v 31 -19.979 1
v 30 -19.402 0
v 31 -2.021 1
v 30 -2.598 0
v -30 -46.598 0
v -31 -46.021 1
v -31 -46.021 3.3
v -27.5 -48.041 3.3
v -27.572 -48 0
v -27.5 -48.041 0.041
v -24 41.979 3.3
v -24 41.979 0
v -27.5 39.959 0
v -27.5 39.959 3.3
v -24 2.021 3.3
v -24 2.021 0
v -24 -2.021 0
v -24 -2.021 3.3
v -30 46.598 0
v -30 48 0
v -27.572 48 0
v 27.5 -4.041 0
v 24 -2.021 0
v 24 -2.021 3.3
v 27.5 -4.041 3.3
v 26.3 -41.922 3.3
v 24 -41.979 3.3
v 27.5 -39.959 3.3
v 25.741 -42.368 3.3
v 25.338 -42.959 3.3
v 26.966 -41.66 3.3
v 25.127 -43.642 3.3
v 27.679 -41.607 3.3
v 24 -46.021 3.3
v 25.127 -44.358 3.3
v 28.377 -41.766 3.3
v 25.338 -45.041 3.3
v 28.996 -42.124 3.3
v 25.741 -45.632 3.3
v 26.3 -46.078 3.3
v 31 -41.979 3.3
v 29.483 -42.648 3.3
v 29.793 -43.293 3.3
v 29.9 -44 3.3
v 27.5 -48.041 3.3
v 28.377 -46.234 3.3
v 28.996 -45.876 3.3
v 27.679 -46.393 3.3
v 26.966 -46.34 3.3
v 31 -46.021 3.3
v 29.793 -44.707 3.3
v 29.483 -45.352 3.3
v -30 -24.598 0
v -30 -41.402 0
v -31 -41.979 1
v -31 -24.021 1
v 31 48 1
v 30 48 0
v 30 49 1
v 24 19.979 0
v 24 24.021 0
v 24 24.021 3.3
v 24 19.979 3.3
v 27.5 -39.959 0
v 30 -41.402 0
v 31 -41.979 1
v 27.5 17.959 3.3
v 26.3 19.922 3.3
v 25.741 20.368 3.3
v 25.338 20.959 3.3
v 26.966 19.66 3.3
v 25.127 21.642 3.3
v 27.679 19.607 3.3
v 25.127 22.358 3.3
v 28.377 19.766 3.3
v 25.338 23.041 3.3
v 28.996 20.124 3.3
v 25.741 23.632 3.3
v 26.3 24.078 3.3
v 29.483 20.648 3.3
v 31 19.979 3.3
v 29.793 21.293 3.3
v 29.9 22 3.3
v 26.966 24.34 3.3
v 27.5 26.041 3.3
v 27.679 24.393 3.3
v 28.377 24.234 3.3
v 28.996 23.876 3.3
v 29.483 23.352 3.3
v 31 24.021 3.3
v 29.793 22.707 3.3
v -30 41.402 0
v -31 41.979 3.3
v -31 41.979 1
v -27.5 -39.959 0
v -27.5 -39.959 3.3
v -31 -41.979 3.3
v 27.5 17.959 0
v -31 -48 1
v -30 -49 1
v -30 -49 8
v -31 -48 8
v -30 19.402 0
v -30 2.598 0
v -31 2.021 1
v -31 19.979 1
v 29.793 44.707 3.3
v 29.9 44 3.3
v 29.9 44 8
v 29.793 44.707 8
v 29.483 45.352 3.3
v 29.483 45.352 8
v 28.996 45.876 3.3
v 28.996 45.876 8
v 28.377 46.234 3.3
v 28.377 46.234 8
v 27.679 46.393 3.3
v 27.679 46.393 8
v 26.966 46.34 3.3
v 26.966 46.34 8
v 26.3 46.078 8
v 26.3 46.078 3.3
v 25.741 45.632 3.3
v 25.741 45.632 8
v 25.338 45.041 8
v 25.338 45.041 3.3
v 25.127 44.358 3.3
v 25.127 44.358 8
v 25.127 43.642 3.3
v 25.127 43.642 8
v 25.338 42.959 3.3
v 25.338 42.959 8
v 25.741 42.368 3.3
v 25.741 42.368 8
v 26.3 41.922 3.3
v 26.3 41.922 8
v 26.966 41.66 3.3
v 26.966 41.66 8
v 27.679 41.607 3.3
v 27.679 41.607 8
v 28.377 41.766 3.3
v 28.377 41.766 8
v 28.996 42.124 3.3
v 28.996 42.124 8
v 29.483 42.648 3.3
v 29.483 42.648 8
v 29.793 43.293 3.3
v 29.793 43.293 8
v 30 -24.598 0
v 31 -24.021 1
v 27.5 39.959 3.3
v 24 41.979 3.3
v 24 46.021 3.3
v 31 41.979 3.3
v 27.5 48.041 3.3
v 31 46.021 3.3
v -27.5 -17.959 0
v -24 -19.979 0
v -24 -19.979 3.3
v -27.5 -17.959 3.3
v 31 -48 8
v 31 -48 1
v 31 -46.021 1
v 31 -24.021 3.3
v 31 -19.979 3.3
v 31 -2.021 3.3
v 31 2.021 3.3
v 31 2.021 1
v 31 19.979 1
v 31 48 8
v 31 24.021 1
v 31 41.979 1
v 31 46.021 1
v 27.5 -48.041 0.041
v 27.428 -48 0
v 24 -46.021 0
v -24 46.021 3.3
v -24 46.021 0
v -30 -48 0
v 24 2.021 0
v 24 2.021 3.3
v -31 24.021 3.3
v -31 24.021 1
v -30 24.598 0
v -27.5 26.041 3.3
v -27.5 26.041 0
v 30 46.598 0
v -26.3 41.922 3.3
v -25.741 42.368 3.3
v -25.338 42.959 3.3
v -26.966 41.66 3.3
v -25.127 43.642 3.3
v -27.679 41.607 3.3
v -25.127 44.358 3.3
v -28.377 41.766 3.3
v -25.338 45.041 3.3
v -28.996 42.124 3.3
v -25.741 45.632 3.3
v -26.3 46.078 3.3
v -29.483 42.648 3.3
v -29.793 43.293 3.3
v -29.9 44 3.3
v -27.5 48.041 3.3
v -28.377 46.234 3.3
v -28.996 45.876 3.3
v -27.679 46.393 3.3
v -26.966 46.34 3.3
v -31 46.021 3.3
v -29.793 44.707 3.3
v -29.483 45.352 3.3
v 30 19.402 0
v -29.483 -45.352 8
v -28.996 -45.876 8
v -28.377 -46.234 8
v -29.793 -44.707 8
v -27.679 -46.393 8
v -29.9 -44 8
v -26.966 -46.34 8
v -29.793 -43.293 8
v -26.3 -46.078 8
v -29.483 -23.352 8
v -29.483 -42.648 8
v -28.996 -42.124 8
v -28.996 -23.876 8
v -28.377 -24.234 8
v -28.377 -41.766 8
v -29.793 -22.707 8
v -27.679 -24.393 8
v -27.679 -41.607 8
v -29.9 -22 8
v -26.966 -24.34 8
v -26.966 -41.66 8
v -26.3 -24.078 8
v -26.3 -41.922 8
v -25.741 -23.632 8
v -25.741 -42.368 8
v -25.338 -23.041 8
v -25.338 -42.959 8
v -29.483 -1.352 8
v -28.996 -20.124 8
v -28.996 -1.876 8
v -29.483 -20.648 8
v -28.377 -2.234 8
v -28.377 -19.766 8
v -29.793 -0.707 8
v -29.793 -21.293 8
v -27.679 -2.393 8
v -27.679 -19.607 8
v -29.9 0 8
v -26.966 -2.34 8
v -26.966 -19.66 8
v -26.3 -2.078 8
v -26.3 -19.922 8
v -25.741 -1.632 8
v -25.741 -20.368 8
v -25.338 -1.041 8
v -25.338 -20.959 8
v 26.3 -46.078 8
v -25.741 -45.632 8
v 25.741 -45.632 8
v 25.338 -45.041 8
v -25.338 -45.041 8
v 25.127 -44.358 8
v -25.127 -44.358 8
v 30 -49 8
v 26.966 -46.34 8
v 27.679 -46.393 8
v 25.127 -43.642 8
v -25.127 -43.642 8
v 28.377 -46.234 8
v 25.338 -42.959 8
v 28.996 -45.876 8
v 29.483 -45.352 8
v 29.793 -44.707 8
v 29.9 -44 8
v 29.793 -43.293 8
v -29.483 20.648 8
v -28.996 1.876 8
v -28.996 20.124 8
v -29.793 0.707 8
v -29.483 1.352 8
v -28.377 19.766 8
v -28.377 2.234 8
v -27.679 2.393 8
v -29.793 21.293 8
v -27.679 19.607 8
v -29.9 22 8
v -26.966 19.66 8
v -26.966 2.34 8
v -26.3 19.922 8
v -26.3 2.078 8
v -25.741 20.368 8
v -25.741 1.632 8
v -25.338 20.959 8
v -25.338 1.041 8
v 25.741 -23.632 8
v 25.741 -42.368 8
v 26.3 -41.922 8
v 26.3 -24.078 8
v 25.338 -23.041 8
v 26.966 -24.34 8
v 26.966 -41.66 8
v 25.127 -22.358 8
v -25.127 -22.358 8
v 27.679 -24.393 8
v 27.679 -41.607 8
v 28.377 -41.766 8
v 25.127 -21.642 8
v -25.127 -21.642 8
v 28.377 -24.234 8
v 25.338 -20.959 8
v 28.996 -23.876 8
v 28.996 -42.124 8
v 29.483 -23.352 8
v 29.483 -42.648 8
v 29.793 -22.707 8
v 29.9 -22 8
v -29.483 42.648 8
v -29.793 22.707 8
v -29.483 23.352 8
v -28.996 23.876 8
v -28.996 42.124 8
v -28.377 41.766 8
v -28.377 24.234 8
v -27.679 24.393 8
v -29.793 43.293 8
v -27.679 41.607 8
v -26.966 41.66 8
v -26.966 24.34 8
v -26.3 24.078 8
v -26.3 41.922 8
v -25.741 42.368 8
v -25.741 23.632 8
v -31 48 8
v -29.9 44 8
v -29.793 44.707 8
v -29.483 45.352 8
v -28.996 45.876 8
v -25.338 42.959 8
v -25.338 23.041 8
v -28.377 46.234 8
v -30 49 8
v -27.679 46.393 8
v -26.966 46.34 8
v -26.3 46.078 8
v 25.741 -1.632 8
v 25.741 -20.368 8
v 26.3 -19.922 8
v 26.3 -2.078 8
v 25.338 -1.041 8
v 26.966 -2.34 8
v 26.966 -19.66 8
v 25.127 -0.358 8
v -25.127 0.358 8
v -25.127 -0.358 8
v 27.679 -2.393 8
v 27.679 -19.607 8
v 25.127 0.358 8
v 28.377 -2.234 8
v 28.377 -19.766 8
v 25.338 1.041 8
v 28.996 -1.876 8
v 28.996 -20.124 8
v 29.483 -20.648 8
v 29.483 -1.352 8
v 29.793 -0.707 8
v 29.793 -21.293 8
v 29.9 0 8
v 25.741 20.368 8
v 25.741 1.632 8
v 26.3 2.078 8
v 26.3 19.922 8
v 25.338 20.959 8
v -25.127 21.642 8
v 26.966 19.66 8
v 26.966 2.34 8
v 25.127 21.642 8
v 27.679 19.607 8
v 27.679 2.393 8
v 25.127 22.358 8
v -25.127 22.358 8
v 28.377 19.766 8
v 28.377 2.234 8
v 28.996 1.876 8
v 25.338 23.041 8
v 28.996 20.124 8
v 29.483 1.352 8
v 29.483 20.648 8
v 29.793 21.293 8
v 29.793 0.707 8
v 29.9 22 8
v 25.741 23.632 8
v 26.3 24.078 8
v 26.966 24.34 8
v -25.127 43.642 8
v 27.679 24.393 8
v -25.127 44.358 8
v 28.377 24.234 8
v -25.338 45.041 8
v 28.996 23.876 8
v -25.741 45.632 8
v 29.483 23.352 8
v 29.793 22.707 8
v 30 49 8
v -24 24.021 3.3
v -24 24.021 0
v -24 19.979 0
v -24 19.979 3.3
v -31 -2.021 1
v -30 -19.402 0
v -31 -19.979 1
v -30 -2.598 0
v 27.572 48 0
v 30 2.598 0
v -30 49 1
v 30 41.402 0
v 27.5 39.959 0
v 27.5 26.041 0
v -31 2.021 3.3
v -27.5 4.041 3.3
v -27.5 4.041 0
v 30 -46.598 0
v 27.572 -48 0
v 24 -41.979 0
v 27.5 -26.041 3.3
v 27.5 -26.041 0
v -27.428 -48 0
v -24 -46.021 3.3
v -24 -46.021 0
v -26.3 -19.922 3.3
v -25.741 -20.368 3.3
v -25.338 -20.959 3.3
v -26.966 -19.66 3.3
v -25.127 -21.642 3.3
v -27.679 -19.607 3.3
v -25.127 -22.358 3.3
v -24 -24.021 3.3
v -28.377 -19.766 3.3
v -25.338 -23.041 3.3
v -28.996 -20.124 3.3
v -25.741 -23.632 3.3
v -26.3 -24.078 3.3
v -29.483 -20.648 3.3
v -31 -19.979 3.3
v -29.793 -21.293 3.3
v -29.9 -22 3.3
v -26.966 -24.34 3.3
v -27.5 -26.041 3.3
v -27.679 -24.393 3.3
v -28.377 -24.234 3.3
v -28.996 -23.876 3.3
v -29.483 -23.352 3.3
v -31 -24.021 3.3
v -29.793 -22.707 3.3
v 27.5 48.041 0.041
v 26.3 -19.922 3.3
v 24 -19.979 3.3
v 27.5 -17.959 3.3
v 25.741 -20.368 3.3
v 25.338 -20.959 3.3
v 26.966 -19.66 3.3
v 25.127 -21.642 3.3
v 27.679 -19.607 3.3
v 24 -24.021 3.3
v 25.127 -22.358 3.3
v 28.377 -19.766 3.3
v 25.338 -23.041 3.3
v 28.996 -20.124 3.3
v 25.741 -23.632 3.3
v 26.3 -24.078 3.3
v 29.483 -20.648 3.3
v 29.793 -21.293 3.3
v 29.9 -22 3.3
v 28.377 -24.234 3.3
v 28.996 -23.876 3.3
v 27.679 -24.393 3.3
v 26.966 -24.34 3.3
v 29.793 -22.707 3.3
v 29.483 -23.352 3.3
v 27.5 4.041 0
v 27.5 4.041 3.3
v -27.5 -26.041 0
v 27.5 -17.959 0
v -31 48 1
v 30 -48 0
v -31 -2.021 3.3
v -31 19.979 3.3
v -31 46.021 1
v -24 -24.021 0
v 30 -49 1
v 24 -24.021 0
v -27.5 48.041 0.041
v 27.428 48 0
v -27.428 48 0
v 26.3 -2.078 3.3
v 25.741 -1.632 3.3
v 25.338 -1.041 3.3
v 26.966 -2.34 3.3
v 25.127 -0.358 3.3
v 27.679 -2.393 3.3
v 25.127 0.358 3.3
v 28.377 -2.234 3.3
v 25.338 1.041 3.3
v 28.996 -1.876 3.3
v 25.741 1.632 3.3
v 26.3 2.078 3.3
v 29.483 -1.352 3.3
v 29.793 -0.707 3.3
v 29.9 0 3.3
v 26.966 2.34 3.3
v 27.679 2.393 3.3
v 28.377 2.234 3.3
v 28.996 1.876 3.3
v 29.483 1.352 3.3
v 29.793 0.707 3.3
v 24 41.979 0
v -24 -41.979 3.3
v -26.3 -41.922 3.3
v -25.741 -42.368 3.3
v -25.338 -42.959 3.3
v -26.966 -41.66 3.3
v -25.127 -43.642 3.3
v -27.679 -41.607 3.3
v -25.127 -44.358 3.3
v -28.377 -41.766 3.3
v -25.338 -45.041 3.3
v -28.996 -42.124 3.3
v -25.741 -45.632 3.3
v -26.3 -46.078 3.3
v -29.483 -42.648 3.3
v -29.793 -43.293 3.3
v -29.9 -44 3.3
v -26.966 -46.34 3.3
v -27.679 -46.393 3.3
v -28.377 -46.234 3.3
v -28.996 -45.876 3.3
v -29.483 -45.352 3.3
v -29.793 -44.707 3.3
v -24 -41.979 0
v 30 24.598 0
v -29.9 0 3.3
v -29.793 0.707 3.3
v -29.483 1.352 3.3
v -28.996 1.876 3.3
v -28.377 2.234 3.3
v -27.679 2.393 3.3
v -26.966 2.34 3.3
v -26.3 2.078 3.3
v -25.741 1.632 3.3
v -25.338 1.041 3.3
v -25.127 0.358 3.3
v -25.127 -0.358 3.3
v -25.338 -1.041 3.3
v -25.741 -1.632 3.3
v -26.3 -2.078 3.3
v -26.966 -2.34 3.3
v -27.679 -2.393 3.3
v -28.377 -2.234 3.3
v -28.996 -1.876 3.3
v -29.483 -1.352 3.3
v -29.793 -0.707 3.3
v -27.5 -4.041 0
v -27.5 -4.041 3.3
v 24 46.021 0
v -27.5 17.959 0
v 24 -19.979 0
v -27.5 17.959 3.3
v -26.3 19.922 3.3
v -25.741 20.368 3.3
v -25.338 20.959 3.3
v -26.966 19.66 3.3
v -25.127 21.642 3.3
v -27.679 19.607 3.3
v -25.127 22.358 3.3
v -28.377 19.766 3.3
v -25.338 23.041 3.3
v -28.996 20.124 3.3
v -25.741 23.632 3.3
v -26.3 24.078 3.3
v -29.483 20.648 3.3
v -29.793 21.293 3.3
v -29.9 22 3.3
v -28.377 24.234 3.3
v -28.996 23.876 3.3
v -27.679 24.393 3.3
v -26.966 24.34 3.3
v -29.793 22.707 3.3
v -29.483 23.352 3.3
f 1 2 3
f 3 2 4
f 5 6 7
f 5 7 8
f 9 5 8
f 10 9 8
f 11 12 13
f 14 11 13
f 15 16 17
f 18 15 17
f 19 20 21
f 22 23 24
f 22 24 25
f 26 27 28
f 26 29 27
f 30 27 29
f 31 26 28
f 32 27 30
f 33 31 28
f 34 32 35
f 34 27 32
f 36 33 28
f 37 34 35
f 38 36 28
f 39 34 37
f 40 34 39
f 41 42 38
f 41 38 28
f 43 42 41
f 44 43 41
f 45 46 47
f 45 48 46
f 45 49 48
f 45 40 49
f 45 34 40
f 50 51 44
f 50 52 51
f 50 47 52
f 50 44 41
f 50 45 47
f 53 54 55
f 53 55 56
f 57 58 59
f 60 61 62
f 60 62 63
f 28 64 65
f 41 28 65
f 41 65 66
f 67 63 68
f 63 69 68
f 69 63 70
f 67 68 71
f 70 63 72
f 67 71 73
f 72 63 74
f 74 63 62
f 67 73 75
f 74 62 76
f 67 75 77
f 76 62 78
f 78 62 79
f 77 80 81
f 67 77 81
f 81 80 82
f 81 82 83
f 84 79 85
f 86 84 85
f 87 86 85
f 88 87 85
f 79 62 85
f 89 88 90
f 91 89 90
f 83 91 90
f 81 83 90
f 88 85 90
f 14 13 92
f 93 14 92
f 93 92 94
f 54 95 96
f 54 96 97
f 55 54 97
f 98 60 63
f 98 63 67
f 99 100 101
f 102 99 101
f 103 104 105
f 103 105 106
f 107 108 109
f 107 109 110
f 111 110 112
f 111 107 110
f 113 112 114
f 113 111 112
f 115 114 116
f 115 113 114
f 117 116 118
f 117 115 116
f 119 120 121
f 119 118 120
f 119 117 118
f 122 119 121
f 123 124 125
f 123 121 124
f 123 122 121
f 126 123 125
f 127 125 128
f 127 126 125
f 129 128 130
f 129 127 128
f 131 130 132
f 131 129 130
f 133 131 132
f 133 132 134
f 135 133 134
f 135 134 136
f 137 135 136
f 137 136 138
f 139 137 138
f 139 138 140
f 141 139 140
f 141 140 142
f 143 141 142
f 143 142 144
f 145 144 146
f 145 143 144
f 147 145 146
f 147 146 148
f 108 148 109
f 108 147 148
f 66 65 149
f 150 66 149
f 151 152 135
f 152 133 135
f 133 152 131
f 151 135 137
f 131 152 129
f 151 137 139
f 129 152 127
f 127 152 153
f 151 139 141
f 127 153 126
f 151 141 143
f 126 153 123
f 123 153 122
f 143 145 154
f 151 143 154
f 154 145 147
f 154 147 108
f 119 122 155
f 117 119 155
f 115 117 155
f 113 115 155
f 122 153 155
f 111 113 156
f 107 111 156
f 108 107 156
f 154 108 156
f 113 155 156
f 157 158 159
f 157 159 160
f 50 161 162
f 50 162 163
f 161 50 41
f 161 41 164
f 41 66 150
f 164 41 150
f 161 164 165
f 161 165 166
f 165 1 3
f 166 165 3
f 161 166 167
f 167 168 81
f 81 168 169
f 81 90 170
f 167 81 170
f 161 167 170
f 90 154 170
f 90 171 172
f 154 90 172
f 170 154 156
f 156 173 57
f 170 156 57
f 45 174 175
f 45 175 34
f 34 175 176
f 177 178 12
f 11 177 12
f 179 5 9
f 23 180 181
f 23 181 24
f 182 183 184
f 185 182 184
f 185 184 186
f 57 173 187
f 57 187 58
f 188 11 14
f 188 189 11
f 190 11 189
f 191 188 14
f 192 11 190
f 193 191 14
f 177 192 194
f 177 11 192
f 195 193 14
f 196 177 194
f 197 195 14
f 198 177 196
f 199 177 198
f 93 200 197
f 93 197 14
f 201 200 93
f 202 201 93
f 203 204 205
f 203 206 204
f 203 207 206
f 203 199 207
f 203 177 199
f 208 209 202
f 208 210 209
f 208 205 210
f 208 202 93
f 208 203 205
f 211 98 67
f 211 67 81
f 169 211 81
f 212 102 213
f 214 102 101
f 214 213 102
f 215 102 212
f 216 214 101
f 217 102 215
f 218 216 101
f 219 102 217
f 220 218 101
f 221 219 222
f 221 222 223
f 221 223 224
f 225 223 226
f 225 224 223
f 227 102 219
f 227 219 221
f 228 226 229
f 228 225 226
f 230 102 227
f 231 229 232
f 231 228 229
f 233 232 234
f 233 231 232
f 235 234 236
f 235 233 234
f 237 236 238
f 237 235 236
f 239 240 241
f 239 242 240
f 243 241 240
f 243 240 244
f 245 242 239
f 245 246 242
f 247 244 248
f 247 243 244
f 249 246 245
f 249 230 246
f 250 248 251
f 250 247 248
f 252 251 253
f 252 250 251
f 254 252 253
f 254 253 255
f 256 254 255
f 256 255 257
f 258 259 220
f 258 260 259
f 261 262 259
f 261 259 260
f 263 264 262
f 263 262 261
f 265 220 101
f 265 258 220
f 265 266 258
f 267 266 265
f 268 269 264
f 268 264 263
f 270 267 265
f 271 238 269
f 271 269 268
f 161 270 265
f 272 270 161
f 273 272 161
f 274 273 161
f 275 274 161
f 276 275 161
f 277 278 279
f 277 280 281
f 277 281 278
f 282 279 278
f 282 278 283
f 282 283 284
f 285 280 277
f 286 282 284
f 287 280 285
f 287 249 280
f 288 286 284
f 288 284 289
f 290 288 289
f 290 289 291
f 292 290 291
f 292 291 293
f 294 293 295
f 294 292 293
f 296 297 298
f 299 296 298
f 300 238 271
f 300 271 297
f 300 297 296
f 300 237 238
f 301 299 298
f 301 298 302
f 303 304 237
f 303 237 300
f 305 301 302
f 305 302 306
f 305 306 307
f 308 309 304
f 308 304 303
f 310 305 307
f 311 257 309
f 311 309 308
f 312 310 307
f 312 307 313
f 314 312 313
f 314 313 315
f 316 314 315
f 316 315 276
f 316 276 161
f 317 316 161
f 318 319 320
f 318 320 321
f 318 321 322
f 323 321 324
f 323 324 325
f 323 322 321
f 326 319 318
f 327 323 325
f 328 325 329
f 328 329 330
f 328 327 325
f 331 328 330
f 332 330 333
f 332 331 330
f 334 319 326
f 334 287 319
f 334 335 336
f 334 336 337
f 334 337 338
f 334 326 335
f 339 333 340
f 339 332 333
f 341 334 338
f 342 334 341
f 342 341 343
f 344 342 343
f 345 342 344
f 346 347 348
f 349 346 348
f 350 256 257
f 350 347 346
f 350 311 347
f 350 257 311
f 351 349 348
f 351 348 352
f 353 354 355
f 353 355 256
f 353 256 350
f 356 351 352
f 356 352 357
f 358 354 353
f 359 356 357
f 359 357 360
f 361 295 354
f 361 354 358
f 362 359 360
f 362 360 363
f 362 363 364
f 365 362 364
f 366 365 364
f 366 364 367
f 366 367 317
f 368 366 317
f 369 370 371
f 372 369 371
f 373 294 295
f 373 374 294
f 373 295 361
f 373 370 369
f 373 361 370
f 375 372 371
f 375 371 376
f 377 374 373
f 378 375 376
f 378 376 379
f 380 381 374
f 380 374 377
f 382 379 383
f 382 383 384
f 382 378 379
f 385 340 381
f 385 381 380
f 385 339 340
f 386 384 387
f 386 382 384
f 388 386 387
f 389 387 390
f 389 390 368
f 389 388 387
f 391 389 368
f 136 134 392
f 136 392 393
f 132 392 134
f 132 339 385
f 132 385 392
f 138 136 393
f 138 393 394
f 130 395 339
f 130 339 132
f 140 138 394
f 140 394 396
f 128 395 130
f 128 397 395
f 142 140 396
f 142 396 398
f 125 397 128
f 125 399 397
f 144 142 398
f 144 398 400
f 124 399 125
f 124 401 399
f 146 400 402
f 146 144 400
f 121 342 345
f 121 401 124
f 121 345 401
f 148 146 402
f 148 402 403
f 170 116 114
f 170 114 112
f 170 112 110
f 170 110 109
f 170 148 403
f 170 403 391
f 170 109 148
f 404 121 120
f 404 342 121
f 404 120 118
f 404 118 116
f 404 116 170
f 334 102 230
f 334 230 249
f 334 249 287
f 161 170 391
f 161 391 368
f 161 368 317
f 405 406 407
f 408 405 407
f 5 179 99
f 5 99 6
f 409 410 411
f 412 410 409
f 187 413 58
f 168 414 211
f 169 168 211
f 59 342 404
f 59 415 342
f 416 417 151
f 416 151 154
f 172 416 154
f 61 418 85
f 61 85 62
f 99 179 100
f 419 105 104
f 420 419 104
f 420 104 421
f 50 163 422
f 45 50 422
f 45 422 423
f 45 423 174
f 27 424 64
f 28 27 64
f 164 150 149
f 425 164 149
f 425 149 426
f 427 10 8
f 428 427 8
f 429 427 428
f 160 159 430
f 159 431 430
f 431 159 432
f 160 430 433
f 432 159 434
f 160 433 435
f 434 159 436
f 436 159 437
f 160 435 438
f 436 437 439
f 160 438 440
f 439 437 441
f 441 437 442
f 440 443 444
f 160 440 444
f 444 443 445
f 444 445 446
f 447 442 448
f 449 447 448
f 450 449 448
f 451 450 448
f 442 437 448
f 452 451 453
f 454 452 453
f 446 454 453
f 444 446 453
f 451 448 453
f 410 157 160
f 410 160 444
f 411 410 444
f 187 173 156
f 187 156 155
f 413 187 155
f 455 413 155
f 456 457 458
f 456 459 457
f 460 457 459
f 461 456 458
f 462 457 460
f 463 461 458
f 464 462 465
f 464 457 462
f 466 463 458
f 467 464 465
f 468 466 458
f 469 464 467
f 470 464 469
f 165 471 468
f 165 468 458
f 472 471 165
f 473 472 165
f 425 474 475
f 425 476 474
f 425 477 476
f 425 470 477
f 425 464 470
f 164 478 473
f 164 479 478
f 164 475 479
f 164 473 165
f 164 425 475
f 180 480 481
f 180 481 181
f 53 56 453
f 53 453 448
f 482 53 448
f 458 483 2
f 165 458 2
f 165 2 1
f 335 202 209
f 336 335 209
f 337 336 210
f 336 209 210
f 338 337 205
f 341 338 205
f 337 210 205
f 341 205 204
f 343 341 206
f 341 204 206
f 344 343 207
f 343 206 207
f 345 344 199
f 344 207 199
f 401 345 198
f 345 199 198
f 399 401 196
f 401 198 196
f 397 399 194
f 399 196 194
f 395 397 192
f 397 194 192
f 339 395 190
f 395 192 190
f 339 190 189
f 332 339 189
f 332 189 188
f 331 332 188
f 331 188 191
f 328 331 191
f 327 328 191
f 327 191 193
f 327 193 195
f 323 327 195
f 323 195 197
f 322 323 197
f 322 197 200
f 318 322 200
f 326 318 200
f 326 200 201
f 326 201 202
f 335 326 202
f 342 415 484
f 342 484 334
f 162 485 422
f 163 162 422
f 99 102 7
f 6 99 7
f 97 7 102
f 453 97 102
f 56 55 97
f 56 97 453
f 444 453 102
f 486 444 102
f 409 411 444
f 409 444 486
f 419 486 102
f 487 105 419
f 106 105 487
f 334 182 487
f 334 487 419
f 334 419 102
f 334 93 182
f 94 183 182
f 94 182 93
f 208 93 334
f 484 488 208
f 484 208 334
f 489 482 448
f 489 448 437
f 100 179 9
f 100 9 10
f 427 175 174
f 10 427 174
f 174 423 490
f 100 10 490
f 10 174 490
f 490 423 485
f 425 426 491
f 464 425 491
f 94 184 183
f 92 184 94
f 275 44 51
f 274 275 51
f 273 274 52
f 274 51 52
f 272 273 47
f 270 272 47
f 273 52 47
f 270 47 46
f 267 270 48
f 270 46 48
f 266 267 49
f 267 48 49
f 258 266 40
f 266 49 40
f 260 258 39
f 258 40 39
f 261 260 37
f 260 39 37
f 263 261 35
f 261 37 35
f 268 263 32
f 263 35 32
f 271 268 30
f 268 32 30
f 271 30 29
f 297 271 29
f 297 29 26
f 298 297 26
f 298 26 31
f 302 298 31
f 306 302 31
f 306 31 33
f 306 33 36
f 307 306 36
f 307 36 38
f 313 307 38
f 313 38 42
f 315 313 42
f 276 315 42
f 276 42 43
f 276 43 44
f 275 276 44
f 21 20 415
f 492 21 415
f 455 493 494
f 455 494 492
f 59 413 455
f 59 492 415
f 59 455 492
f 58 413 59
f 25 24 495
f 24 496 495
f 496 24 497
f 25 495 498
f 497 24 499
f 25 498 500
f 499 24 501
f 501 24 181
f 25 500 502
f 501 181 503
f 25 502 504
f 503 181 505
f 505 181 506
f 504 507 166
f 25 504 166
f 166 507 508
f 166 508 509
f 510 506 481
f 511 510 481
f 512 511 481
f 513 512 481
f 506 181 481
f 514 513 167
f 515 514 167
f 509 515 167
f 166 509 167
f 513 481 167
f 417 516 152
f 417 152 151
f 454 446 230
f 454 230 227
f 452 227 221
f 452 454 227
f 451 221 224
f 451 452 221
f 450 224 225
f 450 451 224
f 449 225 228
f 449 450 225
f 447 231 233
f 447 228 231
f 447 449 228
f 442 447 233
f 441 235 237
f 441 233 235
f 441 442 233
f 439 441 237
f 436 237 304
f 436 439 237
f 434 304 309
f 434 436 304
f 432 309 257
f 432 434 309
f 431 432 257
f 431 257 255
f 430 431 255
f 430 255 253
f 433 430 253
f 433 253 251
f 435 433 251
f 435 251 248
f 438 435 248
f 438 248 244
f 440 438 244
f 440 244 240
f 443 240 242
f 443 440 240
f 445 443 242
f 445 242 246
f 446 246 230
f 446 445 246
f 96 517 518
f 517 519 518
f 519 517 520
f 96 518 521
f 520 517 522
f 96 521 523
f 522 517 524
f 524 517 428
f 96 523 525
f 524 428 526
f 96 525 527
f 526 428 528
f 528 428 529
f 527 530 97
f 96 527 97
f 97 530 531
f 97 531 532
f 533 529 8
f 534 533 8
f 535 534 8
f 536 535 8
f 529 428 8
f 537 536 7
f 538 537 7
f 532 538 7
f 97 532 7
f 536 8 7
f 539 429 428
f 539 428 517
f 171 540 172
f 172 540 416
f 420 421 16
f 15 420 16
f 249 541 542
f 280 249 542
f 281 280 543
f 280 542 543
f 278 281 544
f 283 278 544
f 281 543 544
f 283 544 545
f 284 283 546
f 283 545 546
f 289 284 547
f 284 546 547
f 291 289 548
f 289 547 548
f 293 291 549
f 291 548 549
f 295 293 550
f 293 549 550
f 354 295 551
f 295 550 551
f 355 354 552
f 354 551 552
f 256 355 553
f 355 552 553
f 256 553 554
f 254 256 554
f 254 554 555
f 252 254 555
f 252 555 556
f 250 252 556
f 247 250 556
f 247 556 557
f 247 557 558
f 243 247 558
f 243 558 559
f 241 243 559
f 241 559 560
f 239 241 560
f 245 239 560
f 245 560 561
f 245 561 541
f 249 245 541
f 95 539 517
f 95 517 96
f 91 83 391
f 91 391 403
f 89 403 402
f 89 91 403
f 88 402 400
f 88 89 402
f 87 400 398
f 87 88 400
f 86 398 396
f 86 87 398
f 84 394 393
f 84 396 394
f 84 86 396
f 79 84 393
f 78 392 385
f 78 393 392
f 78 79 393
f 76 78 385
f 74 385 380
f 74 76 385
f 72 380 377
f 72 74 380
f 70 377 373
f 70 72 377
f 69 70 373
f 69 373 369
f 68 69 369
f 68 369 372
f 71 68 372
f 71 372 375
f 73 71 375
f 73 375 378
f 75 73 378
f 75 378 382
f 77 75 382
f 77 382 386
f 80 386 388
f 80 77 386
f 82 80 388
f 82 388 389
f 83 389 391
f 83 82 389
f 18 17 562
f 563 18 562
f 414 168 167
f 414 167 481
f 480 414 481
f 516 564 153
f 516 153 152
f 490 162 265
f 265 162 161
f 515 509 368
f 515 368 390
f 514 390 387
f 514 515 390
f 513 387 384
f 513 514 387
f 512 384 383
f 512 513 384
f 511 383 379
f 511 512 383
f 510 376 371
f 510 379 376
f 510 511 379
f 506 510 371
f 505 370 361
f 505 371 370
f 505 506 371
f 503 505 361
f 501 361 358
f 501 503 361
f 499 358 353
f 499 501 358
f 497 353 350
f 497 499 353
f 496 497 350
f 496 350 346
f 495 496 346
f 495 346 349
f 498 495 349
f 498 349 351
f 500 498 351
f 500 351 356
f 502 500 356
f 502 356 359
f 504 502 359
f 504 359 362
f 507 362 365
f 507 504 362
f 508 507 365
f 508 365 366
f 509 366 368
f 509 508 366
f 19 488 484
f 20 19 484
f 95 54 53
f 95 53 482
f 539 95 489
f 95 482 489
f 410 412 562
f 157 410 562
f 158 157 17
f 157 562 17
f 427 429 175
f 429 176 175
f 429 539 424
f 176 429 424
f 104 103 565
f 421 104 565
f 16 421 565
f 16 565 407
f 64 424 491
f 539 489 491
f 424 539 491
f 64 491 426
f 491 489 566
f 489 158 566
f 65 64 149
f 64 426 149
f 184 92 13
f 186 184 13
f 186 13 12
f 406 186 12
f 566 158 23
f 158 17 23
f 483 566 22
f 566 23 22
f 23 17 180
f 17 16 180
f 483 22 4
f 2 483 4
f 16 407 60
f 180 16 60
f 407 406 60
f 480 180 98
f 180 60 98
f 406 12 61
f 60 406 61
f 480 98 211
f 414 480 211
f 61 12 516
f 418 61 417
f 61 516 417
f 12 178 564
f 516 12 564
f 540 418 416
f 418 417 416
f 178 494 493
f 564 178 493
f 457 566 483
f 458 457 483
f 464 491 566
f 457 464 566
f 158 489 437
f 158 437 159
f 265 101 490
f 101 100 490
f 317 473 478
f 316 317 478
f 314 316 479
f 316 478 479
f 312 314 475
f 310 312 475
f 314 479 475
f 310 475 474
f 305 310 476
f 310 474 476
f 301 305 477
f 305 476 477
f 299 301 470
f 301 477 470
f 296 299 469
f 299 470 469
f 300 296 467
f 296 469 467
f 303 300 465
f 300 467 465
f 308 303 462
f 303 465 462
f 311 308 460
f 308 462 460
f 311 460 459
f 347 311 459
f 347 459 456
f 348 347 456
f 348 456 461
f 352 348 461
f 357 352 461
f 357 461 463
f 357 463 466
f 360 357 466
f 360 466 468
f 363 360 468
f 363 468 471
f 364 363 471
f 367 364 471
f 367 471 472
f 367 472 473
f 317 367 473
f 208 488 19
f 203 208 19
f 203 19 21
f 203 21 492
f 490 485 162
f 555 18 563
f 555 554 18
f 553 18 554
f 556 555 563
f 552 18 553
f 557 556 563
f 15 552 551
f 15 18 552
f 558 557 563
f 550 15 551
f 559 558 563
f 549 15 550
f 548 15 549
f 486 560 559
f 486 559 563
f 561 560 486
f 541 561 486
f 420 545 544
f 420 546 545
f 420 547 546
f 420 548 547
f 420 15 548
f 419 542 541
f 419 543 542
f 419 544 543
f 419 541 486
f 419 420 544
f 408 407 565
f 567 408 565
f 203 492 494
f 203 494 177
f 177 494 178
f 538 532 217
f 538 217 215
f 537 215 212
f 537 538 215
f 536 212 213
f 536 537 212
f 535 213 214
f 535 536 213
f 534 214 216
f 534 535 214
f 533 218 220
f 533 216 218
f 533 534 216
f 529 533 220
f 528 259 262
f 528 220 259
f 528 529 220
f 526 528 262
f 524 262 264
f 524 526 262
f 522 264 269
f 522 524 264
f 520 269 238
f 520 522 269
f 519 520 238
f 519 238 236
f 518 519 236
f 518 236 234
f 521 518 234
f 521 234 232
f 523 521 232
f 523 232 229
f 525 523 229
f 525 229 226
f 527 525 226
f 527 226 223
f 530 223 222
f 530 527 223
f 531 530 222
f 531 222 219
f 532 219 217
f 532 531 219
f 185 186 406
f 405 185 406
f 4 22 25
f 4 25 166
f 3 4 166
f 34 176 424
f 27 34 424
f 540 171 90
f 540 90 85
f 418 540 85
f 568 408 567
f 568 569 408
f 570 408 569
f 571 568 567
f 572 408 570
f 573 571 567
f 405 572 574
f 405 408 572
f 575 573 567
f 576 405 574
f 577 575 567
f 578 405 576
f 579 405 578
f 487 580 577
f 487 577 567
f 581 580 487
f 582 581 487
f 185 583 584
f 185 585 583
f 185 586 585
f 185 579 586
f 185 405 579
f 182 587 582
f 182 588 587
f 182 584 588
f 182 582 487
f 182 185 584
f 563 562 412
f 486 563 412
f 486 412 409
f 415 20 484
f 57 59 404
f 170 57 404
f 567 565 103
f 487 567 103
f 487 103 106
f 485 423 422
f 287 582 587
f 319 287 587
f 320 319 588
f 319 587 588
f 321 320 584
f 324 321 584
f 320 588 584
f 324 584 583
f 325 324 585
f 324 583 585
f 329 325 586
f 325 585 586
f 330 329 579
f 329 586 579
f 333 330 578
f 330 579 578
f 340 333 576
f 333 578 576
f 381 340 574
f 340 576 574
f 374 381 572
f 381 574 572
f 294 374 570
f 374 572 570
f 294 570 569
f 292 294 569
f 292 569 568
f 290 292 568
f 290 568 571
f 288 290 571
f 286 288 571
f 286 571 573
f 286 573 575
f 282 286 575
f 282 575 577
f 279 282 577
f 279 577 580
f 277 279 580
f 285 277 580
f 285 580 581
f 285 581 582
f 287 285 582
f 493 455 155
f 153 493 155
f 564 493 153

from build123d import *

# Parameters (mm, degrees)
SKETCH_1_W            = 62
SKETCH_1_H            = 98
EXTRUDE_1_DEPTH       = 8
CHAMFER_1_SIZE        = 1
HOLE_WIZARD_M4_1_D    = 4.8
CUT_EXTRUDE_1_DEPTH   = 3.3
MIRROR_2_COPY_1_D     = 4.8
MIRROR_2_COPY_2_DEPTH = 3.3


with BuildPart() as part:
    # ｽｹｯﾁ1 → ﾎﾞｽ - 押し出し1 (new body)
    with BuildSketch(Plane.XY):
        Rectangle(SKETCH_1_W, SKETCH_1_H)
    extrude(amount=EXTRUDE_1_DEPTH)

    # 面取り1
    chamfer_1_edges = [part.edges().sort_by_distance(p)[0] for p in [
        (0, -49, 0),
        (-31, 0, 0),
        (0, 49, 0),
        (31, 0, 0),
        (31, -49, 4),
        (-31, -49, 4),
        (-31, 49, 4),
        (31, 49, 4),
    ]]
    chamfer(chamfer_1_edges, length=CHAMFER_1_SIZE)

    # M4 すきま穴1 (through all)
    with Locations(Plane.XY.offset(8)):
        with Locations((-27.5, 44), (-27.5, 22), (-27.5, 0)):
            hole_wizard_m4_1 = Hole(HOLE_WIZARD_M4_1_D / 2)

    # ｽｹｯﾁ6 → ｶｯﾄ - 押し出し1 (cut)
    with BuildSketch(Plane(origin=(0, 0, 0), x_dir=(-1, 0, 0), z_dir=(0, 0, -1))):
        Polygon((27.5, 17.958548116), (31, 19.979274058), (31, 24.020725942), (27.5, 26.041451884), (24, 24.020725942), (24, 19.979274058), align=None)
        Polygon((27.5, 39.958548116), (31, 41.979274058), (31, 46.020725942), (27.5, 48.041451884), (24, 46.020725942), (24, 41.979274058), align=None)
        Polygon((27.5, -4.041451884), (31, -2.020725942), (31, 2.020725942), (27.5, 4.041451884), (24, 2.020725942), (24, -2.020725942), align=None)
    cut_extrude_1 = extrude(amount=-CUT_EXTRUDE_1_DEPTH, mode=Mode.SUBTRACT)

    # ﾐﾗｰ1: M4 すきま穴1, ｶｯﾄ - 押し出し1 across plane
    add(hole_wizard_m4_1.mirror(Plane.ZX), mode=Mode.SUBTRACT)
    add(cut_extrude_1.mirror(Plane.ZX), mode=Mode.SUBTRACT)

    # ﾐﾗｰ2: M4 すきま穴1, ｶｯﾄ - 押し出し1 across plane
    add(hole_wizard_m4_1.mirror(Plane(origin=(0, 0, 0), x_dir=(0, 0, 1), z_dir=(1, 0, 0))), mode=Mode.SUBTRACT)
    add(cut_extrude_1.mirror(Plane(origin=(0, 0, 0), x_dir=(0, 0, 1), z_dir=(1, 0, 0))), mode=Mode.SUBTRACT)

    # ﾐﾗｰ2 copy 1 (through all)
    with Locations(Plane(origin=(0, 0, 8), x_dir=(-1, 0, 0), z_dir=(0, 0, 1))):
        with Locations((-27.5, 44), (-27.5, 22), (-27.5, 0)):
            Hole(MIRROR_2_COPY_1_D / 2)

    # ﾐﾗｰ2 copy 2 sketch → ﾐﾗｰ2 copy 2 (cut)
    with BuildSketch(Plane(origin=(0, 0, 0), x_dir=(1, 0, 0), z_dir=(0, 0, -1))):
        Polygon((27.5, 17.958548116), (31, 19.979274058), (31, 24.020725942), (27.5, 26.041451884), (24, 24.020725942), (24, 19.979274058), align=None)
        Polygon((27.5, 39.958548116), (31, 41.979274058), (31, 46.020725942), (27.5, 48.041451884), (24, 46.020725942), (24, 41.979274058), align=None)
        Polygon((27.5, -4.041451884), (31, -2.020725942), (31, 2.020725942), (27.5, 4.041451884), (24, 2.020725942), (24, -2.020725942), align=None)
    extrude(amount=-MIRROR_2_COPY_2_DEPTH, mode=Mode.SUBTRACT)


solid = part.part
